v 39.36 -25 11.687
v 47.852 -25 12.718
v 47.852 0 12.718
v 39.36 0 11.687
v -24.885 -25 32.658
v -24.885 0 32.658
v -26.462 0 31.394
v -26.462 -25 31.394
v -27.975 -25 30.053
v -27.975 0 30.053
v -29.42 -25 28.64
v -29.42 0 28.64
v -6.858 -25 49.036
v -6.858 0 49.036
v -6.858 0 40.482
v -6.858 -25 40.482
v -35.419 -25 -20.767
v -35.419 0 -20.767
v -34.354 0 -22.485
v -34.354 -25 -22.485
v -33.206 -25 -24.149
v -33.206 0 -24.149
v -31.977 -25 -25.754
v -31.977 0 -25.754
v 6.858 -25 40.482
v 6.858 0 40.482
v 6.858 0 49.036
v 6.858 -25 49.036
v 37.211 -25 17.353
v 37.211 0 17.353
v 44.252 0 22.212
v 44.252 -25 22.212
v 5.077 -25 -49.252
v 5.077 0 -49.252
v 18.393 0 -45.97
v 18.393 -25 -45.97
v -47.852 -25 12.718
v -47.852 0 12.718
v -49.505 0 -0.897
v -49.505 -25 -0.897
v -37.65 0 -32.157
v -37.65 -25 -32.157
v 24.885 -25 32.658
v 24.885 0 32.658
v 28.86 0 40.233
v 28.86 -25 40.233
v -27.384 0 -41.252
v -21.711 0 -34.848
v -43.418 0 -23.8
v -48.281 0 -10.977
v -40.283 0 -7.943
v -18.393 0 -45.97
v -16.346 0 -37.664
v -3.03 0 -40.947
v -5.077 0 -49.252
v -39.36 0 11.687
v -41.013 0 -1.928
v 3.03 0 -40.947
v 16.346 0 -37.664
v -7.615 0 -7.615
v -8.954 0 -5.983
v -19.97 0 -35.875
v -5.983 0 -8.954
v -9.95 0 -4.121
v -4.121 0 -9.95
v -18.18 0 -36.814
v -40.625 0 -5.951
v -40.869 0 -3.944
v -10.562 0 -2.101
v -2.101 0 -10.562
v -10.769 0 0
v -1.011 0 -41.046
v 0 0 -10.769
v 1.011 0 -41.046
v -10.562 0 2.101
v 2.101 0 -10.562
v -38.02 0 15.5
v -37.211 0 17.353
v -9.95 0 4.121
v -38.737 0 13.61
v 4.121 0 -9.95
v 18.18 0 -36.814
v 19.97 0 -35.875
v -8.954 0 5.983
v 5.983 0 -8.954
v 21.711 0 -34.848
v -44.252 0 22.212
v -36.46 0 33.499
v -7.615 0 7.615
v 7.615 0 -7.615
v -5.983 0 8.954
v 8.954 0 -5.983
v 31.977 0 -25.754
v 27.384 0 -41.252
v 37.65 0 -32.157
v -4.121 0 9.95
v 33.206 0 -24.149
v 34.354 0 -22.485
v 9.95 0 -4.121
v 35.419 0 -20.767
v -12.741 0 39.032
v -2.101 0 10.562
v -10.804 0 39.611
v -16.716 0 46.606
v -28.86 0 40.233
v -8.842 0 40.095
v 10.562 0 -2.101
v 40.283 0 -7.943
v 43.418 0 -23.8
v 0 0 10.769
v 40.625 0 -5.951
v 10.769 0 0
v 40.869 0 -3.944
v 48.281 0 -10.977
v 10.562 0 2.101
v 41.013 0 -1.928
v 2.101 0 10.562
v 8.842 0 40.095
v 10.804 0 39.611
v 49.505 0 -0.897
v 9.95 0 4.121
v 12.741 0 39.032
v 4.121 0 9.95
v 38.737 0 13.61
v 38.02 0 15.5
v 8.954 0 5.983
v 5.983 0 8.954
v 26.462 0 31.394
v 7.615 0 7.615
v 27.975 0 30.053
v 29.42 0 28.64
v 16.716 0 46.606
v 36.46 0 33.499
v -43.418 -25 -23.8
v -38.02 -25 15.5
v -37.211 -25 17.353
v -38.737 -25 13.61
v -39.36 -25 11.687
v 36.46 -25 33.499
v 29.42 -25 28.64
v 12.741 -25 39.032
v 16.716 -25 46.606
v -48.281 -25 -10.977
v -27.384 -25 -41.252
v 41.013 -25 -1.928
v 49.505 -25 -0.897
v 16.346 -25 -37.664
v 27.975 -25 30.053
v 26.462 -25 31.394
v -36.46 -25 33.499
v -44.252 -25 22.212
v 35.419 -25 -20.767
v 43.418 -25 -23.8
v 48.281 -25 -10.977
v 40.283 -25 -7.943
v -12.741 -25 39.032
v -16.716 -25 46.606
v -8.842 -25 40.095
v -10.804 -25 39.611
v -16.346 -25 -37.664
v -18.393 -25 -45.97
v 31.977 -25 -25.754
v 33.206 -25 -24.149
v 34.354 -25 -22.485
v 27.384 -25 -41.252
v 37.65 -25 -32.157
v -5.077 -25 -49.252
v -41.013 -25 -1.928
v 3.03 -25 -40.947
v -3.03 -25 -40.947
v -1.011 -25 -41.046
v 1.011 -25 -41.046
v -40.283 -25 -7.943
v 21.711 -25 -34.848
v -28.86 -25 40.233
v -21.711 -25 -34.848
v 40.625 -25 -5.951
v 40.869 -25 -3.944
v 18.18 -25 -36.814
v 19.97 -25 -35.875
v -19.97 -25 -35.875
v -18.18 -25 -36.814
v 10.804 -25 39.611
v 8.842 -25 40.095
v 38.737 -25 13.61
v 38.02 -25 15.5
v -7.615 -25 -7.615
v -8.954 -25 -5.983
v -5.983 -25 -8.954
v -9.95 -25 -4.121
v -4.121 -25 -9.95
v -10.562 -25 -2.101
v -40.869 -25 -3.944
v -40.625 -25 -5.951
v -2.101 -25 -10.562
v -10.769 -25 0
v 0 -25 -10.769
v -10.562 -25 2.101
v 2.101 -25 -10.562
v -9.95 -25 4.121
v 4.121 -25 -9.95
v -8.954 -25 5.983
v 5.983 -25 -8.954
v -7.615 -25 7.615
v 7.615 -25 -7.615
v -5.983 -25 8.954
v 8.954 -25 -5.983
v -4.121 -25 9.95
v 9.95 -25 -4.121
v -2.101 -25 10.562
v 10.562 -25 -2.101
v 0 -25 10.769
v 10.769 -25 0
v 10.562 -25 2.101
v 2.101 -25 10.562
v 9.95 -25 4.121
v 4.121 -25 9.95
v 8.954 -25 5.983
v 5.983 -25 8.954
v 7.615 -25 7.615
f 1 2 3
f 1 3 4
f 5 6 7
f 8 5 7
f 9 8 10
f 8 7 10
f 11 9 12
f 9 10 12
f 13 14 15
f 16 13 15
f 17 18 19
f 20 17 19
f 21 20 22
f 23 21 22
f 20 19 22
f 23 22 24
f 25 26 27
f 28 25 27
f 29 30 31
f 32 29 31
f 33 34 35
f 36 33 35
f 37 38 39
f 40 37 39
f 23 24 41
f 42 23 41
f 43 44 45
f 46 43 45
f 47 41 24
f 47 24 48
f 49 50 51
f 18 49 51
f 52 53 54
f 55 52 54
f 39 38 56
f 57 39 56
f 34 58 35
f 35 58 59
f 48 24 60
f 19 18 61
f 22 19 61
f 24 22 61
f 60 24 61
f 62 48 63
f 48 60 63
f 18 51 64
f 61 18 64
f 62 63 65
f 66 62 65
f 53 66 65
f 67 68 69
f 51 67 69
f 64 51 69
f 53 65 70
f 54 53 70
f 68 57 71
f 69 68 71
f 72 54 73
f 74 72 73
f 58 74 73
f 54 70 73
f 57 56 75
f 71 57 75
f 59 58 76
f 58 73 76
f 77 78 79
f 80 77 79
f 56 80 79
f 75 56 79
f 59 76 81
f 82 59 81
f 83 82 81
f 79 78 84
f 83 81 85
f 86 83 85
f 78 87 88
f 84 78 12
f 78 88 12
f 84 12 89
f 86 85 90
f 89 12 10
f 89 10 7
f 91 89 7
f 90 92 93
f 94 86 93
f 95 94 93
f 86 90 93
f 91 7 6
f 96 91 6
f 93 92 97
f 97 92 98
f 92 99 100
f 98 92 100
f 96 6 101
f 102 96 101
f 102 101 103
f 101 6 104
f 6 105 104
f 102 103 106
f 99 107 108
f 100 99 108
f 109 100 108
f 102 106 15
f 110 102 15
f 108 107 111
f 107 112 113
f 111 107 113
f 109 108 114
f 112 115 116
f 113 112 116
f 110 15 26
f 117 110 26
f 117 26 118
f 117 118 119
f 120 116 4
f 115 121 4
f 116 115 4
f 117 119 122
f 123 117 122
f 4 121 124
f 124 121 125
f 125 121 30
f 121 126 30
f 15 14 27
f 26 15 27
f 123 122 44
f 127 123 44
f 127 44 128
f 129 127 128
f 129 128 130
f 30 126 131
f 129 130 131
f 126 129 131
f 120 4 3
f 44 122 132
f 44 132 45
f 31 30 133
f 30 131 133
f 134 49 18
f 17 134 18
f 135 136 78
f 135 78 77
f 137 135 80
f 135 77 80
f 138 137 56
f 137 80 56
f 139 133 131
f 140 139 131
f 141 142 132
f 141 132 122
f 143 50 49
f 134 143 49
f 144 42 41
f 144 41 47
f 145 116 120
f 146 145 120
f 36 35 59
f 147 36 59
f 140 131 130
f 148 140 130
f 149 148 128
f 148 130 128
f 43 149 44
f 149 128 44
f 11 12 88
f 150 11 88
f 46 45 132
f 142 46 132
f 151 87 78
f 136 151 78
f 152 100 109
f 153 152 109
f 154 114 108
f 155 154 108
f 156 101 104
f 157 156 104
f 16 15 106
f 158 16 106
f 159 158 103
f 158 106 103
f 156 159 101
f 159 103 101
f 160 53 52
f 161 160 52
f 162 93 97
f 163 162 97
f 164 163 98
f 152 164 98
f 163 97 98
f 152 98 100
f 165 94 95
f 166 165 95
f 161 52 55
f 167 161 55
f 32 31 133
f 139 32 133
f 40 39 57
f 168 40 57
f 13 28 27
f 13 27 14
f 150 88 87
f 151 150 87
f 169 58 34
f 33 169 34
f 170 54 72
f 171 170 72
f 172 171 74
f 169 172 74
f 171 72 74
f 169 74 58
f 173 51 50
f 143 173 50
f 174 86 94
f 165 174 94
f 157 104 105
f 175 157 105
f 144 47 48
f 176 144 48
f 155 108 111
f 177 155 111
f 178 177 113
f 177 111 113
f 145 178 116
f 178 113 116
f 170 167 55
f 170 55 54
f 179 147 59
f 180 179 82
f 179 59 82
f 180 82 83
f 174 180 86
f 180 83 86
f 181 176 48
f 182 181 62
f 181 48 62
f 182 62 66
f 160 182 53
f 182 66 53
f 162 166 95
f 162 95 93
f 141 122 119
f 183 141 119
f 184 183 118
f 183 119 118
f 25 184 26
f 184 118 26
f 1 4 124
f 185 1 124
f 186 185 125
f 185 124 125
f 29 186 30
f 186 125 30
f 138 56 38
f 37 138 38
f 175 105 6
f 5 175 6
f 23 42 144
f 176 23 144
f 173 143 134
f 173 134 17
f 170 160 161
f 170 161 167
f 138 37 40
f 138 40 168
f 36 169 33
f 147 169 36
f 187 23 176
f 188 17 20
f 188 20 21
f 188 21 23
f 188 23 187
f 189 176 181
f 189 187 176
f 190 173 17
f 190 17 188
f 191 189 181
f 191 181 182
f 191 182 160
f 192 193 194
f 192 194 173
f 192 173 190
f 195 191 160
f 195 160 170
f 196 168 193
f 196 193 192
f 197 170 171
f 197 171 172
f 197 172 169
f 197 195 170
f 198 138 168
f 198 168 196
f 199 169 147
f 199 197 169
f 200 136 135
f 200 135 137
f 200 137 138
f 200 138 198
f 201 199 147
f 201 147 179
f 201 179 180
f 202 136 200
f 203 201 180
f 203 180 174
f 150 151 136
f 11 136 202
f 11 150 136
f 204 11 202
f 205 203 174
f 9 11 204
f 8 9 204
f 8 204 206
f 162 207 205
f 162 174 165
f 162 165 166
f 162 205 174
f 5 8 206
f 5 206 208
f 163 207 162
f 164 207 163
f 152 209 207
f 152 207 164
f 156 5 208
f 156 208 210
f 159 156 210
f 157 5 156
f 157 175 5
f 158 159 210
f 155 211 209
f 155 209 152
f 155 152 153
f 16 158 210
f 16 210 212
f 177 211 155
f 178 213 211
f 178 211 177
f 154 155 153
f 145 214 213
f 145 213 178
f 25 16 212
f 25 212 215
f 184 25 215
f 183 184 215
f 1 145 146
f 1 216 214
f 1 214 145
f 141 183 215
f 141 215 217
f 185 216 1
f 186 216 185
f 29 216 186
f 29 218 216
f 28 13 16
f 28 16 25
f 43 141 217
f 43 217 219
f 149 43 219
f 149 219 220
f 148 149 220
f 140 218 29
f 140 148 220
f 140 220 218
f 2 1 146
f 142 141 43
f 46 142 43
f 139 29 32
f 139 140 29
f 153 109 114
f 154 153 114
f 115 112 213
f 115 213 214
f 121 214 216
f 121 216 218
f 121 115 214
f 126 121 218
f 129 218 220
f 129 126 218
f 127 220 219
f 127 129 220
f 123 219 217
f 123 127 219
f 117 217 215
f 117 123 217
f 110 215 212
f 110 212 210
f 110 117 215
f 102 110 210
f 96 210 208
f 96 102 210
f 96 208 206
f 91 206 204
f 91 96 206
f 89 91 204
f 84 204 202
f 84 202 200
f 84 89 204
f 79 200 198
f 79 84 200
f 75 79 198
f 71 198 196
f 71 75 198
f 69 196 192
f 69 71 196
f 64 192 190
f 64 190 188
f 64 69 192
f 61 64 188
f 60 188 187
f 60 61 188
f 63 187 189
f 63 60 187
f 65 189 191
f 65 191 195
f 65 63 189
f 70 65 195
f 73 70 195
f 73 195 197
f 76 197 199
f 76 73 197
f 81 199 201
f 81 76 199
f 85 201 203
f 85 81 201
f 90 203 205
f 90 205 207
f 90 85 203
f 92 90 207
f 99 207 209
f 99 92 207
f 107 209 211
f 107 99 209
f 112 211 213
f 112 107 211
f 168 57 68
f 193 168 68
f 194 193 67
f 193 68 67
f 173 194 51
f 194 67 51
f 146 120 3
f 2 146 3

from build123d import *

# Parameters (mm, degrees)
F0_R     = 10.769263
F1_DEPTH = 25


with BuildPart() as f1:
    # F0 (on Front) → F1 (new body)
    with BuildSketch(Plane.XZ):
        with BuildLine():
            ThreePointArc((41.013222, -1.92807), (41.047192, -0.964301), (41.058517, 0))
            ThreePointArc((41.058517, 0), (40.631678, 5.904962), (39.360035, 11.68715))
            ThreePointArc((39.360035, 11.68715), (38.390381, 14.559551), (37.211423, 17.352574))
            ThreePointArc((37.211423, 17.352574), (33.790497, 23.323896), (29.420291, 28.639978))
            ThreePointArc((29.420291, 28.639978), (27.226833, 30.732742), (24.884936, 32.657952))
            ThreePointArc((24.884936, 32.657952), (19.080844, 36.355512), (12.740712, 39.031732))
            ThreePointArc((12.740712, 39.031732), (9.825946, 39.865431), (6.85761, 40.481786))
            ThreePointArc((6.85761, 40.481786), (0, 41.058517), (-6.85761, 40.481786))
            ThreePointArc((-6.85761, 40.481786), (-9.825946, 39.865431), (-12.740712, 39.031732))
            ThreePointArc((-12.740712, 39.031732), (-19.080844, 36.355512), (-24.884936, 32.657952))
            ThreePointArc((-24.884936, 32.657952), (-27.226833, 30.732742), (-29.420291, 28.639978))
            ThreePointArc((-29.420291, 28.639978), (-33.790497, 23.323896), (-37.211423, 17.352574))
            ThreePointArc((-37.211423, 17.352574), (-38.390381, 14.559551), (-39.360035, 11.68715))
            ThreePointArc((-39.360035, 11.68715), (-40.759155, 4.949057), (-41.013222, -1.92807))
            ThreePointArc((-41.013222, -1.92807), (-40.759155, -4.949057), (-40.28287, -7.943063))
            ThreePointArc((-40.28287, -7.943063), (-38.390381, -14.559551), (-35.419386, -20.767016))
            ThreePointArc((-35.419386, -20.767016), (-33.790497, -23.323896), (-31.977384, -25.753616))
            ThreePointArc((-31.977384, -25.753616), (-27.226833, -30.732742), (-21.711395, -34.848489))
            ThreePointArc((-21.711395, -34.848489), (-19.080844, -36.355512), (-16.346266, -37.664326))
            ThreePointArc((-16.346266, -37.664326), (-9.825946, -39.865431), (-3.029586, -40.946593))
            ThreePointArc((-3.029586, -40.946593), (0, -41.058517), (3.029586, -40.946593))
            ThreePointArc((3.029586, -40.946593), (9.825946, -39.865431), (16.346266, -37.664326))
            ThreePointArc((16.346266, -37.664326), (19.080844, -36.355512), (21.711395, -34.848489))
            ThreePointArc((21.711395, -34.848489), (27.226833, -30.732742), (31.977384, -25.753616))
            ThreePointArc((31.977384, -25.753616), (33.790497, -23.323896), (35.419386, -20.767016))
            ThreePointArc((35.419386, -20.767016), (38.390381, -14.559551), (40.28287, -7.943063))
            ThreePointArc((40.28287, -7.943063), (40.759155, -4.949057), (41.013222, -1.92807))
        make_face()
        Circle(F0_R, mode=Mode.SUBTRACT)
        with BuildLine():
            ThreePointArc((39.360035, 11.68715), (40.631678, 5.904962), (41.058517, 0))
            ThreePointArc((41.058517, 0), (41.047192, -0.964301), (41.013222, -1.92807))
            Line((41.013222, -1.92807), (49.50533, -0.896941))
            Line((49.50533, -0.896941), (47.852143, 12.718279))
            Line((47.852143, 12.718279), (39.360035, 11.68715))
        make_face()
        with BuildLine():
            ThreePointArc((29.420291, 28.639978), (33.790497, 23.323896), (37.211423, 17.352574))
            Line((37.211423, 17.352574), (44.251622, 22.212072))
            Line((44.251622, 22.212072), (36.460489, 33.499476))
            Line((36.460489, 33.499476), (29.420291, 28.639978))
        make_face()
        with BuildLine():
            Line((48.281447, -10.976523), (40.28287, -7.943063))
            ThreePointArc((40.28287, -7.943063), (38.390381, -14.559551), (35.419386, -20.767016))
            Line((35.419386, -20.767016), (43.417963, -23.800476))
            Line((43.417963, -23.800476), (48.281447, -10.976523))
        make_face()
        with BuildLine():
            ThreePointArc((12.740712, 39.031732), (19.080844, 36.355512), (24.884936, 32.657952))
            Line((24.884936, 32.657952), (28.860401, 40.232567))
            Line((28.860401, 40.232567), (16.716177, 46.606347))
            Line((16.716177, 46.606347), (12.740712, 39.031732))
        make_face()
        with BuildLine():
            Line((37.650053, -32.156736), (31.977384, -25.753616))
            ThreePointArc((31.977384, -25.753616), (27.226833, -30.732742), (21.711395, -34.848489))
            Line((21.711395, -34.848489), (27.384064, -41.251608))
            Line((27.384064, -41.251608), (37.650053, -32.156736))
        make_face()
        with BuildLine():
            ThreePointArc((-6.85761, 40.481786), (0, 41.058517), (6.85761, 40.481786))
            Line((6.85761, 40.481786), (6.85761, 49.036266))
            Line((6.85761, 49.036266), (-6.85761, 49.036266))
            Line((-6.85761, 49.036266), (-6.85761, 40.481786))
        make_face()
        with BuildLine():
            Line((18.393487, -45.970228), (16.346266, -37.664326))
            ThreePointArc((16.346266, -37.664326), (9.825946, -39.865431), (3.029586, -40.946593))
            Line((3.029586, -40.946593), (5.076807, -49.252495))
            Line((5.076807, -49.252495), (18.393487, -45.970228))
        make_face()
        with BuildLine():
            ThreePointArc((-24.884936, 32.657952), (-19.080844, 36.355512), (-12.740712, 39.031732))
            Line((-12.740712, 39.031732), (-16.716177, 46.606347))
            Line((-16.716177, 46.606347), (-28.860401, 40.232567))
            Line((-28.860401, 40.232567), (-24.884936, 32.657952))
        make_face()
        with BuildLine():
            Line((-5.076807, -49.252495), (-3.029586, -40.946593))
            ThreePointArc((-3.029586, -40.946593), (-9.825946, -39.865431), (-16.346266, -37.664326))
            Line((-16.346266, -37.664326), (-18.393487, -45.970228))
            Line((-18.393487, -45.970228), (-5.076807, -49.252495))
        make_face()
        with BuildLine():
            ThreePointArc((-37.211423, 17.352574), (-33.790497, 23.323896), (-29.420291, 28.639978))
            Line((-29.420291, 28.639978), (-36.460489, 33.499476))
            Line((-36.460489, 33.499476), (-44.251622, 22.212072))
            Line((-44.251622, 22.212072), (-37.211423, 17.352574))
        make_face()
        with BuildLine():
            Line((-27.384064, -41.251608), (-21.711395, -34.848489))
            ThreePointArc((-21.711395, -34.848489), (-27.226833, -30.732742), (-31.977384, -25.753616))
            Line((-31.977384, -25.753616), (-37.650053, -32.156736))
            Line((-37.650053, -32.156736), (-27.384064, -41.251608))
        make_face()
        with BuildLine():
            ThreePointArc((-41.013222, -1.92807), (-40.759155, 4.949057), (-39.360035, 11.68715))
            Line((-39.360035, 11.68715), (-47.852143, 12.718279))
            Line((-47.852143, 12.718279), (-49.50533, -0.896941))
            Line((-49.50533, -0.896941), (-41.013222, -1.92807))
        make_face()
        with BuildLine():
            Line((-43.417963, -23.800476), (-35.419386, -20.767016))
            ThreePointArc((-35.419386, -20.767016), (-38.390381, -14.559551), (-40.28287, -7.943063))
            Line((-40.28287, -7.943063), (-48.281447, -10.976523))
            Line((-48.281447, -10.976523), (-43.417963, -23.800476))
        make_face()
    extrude(amount=F1_DEPTH)


solid = f1.part
